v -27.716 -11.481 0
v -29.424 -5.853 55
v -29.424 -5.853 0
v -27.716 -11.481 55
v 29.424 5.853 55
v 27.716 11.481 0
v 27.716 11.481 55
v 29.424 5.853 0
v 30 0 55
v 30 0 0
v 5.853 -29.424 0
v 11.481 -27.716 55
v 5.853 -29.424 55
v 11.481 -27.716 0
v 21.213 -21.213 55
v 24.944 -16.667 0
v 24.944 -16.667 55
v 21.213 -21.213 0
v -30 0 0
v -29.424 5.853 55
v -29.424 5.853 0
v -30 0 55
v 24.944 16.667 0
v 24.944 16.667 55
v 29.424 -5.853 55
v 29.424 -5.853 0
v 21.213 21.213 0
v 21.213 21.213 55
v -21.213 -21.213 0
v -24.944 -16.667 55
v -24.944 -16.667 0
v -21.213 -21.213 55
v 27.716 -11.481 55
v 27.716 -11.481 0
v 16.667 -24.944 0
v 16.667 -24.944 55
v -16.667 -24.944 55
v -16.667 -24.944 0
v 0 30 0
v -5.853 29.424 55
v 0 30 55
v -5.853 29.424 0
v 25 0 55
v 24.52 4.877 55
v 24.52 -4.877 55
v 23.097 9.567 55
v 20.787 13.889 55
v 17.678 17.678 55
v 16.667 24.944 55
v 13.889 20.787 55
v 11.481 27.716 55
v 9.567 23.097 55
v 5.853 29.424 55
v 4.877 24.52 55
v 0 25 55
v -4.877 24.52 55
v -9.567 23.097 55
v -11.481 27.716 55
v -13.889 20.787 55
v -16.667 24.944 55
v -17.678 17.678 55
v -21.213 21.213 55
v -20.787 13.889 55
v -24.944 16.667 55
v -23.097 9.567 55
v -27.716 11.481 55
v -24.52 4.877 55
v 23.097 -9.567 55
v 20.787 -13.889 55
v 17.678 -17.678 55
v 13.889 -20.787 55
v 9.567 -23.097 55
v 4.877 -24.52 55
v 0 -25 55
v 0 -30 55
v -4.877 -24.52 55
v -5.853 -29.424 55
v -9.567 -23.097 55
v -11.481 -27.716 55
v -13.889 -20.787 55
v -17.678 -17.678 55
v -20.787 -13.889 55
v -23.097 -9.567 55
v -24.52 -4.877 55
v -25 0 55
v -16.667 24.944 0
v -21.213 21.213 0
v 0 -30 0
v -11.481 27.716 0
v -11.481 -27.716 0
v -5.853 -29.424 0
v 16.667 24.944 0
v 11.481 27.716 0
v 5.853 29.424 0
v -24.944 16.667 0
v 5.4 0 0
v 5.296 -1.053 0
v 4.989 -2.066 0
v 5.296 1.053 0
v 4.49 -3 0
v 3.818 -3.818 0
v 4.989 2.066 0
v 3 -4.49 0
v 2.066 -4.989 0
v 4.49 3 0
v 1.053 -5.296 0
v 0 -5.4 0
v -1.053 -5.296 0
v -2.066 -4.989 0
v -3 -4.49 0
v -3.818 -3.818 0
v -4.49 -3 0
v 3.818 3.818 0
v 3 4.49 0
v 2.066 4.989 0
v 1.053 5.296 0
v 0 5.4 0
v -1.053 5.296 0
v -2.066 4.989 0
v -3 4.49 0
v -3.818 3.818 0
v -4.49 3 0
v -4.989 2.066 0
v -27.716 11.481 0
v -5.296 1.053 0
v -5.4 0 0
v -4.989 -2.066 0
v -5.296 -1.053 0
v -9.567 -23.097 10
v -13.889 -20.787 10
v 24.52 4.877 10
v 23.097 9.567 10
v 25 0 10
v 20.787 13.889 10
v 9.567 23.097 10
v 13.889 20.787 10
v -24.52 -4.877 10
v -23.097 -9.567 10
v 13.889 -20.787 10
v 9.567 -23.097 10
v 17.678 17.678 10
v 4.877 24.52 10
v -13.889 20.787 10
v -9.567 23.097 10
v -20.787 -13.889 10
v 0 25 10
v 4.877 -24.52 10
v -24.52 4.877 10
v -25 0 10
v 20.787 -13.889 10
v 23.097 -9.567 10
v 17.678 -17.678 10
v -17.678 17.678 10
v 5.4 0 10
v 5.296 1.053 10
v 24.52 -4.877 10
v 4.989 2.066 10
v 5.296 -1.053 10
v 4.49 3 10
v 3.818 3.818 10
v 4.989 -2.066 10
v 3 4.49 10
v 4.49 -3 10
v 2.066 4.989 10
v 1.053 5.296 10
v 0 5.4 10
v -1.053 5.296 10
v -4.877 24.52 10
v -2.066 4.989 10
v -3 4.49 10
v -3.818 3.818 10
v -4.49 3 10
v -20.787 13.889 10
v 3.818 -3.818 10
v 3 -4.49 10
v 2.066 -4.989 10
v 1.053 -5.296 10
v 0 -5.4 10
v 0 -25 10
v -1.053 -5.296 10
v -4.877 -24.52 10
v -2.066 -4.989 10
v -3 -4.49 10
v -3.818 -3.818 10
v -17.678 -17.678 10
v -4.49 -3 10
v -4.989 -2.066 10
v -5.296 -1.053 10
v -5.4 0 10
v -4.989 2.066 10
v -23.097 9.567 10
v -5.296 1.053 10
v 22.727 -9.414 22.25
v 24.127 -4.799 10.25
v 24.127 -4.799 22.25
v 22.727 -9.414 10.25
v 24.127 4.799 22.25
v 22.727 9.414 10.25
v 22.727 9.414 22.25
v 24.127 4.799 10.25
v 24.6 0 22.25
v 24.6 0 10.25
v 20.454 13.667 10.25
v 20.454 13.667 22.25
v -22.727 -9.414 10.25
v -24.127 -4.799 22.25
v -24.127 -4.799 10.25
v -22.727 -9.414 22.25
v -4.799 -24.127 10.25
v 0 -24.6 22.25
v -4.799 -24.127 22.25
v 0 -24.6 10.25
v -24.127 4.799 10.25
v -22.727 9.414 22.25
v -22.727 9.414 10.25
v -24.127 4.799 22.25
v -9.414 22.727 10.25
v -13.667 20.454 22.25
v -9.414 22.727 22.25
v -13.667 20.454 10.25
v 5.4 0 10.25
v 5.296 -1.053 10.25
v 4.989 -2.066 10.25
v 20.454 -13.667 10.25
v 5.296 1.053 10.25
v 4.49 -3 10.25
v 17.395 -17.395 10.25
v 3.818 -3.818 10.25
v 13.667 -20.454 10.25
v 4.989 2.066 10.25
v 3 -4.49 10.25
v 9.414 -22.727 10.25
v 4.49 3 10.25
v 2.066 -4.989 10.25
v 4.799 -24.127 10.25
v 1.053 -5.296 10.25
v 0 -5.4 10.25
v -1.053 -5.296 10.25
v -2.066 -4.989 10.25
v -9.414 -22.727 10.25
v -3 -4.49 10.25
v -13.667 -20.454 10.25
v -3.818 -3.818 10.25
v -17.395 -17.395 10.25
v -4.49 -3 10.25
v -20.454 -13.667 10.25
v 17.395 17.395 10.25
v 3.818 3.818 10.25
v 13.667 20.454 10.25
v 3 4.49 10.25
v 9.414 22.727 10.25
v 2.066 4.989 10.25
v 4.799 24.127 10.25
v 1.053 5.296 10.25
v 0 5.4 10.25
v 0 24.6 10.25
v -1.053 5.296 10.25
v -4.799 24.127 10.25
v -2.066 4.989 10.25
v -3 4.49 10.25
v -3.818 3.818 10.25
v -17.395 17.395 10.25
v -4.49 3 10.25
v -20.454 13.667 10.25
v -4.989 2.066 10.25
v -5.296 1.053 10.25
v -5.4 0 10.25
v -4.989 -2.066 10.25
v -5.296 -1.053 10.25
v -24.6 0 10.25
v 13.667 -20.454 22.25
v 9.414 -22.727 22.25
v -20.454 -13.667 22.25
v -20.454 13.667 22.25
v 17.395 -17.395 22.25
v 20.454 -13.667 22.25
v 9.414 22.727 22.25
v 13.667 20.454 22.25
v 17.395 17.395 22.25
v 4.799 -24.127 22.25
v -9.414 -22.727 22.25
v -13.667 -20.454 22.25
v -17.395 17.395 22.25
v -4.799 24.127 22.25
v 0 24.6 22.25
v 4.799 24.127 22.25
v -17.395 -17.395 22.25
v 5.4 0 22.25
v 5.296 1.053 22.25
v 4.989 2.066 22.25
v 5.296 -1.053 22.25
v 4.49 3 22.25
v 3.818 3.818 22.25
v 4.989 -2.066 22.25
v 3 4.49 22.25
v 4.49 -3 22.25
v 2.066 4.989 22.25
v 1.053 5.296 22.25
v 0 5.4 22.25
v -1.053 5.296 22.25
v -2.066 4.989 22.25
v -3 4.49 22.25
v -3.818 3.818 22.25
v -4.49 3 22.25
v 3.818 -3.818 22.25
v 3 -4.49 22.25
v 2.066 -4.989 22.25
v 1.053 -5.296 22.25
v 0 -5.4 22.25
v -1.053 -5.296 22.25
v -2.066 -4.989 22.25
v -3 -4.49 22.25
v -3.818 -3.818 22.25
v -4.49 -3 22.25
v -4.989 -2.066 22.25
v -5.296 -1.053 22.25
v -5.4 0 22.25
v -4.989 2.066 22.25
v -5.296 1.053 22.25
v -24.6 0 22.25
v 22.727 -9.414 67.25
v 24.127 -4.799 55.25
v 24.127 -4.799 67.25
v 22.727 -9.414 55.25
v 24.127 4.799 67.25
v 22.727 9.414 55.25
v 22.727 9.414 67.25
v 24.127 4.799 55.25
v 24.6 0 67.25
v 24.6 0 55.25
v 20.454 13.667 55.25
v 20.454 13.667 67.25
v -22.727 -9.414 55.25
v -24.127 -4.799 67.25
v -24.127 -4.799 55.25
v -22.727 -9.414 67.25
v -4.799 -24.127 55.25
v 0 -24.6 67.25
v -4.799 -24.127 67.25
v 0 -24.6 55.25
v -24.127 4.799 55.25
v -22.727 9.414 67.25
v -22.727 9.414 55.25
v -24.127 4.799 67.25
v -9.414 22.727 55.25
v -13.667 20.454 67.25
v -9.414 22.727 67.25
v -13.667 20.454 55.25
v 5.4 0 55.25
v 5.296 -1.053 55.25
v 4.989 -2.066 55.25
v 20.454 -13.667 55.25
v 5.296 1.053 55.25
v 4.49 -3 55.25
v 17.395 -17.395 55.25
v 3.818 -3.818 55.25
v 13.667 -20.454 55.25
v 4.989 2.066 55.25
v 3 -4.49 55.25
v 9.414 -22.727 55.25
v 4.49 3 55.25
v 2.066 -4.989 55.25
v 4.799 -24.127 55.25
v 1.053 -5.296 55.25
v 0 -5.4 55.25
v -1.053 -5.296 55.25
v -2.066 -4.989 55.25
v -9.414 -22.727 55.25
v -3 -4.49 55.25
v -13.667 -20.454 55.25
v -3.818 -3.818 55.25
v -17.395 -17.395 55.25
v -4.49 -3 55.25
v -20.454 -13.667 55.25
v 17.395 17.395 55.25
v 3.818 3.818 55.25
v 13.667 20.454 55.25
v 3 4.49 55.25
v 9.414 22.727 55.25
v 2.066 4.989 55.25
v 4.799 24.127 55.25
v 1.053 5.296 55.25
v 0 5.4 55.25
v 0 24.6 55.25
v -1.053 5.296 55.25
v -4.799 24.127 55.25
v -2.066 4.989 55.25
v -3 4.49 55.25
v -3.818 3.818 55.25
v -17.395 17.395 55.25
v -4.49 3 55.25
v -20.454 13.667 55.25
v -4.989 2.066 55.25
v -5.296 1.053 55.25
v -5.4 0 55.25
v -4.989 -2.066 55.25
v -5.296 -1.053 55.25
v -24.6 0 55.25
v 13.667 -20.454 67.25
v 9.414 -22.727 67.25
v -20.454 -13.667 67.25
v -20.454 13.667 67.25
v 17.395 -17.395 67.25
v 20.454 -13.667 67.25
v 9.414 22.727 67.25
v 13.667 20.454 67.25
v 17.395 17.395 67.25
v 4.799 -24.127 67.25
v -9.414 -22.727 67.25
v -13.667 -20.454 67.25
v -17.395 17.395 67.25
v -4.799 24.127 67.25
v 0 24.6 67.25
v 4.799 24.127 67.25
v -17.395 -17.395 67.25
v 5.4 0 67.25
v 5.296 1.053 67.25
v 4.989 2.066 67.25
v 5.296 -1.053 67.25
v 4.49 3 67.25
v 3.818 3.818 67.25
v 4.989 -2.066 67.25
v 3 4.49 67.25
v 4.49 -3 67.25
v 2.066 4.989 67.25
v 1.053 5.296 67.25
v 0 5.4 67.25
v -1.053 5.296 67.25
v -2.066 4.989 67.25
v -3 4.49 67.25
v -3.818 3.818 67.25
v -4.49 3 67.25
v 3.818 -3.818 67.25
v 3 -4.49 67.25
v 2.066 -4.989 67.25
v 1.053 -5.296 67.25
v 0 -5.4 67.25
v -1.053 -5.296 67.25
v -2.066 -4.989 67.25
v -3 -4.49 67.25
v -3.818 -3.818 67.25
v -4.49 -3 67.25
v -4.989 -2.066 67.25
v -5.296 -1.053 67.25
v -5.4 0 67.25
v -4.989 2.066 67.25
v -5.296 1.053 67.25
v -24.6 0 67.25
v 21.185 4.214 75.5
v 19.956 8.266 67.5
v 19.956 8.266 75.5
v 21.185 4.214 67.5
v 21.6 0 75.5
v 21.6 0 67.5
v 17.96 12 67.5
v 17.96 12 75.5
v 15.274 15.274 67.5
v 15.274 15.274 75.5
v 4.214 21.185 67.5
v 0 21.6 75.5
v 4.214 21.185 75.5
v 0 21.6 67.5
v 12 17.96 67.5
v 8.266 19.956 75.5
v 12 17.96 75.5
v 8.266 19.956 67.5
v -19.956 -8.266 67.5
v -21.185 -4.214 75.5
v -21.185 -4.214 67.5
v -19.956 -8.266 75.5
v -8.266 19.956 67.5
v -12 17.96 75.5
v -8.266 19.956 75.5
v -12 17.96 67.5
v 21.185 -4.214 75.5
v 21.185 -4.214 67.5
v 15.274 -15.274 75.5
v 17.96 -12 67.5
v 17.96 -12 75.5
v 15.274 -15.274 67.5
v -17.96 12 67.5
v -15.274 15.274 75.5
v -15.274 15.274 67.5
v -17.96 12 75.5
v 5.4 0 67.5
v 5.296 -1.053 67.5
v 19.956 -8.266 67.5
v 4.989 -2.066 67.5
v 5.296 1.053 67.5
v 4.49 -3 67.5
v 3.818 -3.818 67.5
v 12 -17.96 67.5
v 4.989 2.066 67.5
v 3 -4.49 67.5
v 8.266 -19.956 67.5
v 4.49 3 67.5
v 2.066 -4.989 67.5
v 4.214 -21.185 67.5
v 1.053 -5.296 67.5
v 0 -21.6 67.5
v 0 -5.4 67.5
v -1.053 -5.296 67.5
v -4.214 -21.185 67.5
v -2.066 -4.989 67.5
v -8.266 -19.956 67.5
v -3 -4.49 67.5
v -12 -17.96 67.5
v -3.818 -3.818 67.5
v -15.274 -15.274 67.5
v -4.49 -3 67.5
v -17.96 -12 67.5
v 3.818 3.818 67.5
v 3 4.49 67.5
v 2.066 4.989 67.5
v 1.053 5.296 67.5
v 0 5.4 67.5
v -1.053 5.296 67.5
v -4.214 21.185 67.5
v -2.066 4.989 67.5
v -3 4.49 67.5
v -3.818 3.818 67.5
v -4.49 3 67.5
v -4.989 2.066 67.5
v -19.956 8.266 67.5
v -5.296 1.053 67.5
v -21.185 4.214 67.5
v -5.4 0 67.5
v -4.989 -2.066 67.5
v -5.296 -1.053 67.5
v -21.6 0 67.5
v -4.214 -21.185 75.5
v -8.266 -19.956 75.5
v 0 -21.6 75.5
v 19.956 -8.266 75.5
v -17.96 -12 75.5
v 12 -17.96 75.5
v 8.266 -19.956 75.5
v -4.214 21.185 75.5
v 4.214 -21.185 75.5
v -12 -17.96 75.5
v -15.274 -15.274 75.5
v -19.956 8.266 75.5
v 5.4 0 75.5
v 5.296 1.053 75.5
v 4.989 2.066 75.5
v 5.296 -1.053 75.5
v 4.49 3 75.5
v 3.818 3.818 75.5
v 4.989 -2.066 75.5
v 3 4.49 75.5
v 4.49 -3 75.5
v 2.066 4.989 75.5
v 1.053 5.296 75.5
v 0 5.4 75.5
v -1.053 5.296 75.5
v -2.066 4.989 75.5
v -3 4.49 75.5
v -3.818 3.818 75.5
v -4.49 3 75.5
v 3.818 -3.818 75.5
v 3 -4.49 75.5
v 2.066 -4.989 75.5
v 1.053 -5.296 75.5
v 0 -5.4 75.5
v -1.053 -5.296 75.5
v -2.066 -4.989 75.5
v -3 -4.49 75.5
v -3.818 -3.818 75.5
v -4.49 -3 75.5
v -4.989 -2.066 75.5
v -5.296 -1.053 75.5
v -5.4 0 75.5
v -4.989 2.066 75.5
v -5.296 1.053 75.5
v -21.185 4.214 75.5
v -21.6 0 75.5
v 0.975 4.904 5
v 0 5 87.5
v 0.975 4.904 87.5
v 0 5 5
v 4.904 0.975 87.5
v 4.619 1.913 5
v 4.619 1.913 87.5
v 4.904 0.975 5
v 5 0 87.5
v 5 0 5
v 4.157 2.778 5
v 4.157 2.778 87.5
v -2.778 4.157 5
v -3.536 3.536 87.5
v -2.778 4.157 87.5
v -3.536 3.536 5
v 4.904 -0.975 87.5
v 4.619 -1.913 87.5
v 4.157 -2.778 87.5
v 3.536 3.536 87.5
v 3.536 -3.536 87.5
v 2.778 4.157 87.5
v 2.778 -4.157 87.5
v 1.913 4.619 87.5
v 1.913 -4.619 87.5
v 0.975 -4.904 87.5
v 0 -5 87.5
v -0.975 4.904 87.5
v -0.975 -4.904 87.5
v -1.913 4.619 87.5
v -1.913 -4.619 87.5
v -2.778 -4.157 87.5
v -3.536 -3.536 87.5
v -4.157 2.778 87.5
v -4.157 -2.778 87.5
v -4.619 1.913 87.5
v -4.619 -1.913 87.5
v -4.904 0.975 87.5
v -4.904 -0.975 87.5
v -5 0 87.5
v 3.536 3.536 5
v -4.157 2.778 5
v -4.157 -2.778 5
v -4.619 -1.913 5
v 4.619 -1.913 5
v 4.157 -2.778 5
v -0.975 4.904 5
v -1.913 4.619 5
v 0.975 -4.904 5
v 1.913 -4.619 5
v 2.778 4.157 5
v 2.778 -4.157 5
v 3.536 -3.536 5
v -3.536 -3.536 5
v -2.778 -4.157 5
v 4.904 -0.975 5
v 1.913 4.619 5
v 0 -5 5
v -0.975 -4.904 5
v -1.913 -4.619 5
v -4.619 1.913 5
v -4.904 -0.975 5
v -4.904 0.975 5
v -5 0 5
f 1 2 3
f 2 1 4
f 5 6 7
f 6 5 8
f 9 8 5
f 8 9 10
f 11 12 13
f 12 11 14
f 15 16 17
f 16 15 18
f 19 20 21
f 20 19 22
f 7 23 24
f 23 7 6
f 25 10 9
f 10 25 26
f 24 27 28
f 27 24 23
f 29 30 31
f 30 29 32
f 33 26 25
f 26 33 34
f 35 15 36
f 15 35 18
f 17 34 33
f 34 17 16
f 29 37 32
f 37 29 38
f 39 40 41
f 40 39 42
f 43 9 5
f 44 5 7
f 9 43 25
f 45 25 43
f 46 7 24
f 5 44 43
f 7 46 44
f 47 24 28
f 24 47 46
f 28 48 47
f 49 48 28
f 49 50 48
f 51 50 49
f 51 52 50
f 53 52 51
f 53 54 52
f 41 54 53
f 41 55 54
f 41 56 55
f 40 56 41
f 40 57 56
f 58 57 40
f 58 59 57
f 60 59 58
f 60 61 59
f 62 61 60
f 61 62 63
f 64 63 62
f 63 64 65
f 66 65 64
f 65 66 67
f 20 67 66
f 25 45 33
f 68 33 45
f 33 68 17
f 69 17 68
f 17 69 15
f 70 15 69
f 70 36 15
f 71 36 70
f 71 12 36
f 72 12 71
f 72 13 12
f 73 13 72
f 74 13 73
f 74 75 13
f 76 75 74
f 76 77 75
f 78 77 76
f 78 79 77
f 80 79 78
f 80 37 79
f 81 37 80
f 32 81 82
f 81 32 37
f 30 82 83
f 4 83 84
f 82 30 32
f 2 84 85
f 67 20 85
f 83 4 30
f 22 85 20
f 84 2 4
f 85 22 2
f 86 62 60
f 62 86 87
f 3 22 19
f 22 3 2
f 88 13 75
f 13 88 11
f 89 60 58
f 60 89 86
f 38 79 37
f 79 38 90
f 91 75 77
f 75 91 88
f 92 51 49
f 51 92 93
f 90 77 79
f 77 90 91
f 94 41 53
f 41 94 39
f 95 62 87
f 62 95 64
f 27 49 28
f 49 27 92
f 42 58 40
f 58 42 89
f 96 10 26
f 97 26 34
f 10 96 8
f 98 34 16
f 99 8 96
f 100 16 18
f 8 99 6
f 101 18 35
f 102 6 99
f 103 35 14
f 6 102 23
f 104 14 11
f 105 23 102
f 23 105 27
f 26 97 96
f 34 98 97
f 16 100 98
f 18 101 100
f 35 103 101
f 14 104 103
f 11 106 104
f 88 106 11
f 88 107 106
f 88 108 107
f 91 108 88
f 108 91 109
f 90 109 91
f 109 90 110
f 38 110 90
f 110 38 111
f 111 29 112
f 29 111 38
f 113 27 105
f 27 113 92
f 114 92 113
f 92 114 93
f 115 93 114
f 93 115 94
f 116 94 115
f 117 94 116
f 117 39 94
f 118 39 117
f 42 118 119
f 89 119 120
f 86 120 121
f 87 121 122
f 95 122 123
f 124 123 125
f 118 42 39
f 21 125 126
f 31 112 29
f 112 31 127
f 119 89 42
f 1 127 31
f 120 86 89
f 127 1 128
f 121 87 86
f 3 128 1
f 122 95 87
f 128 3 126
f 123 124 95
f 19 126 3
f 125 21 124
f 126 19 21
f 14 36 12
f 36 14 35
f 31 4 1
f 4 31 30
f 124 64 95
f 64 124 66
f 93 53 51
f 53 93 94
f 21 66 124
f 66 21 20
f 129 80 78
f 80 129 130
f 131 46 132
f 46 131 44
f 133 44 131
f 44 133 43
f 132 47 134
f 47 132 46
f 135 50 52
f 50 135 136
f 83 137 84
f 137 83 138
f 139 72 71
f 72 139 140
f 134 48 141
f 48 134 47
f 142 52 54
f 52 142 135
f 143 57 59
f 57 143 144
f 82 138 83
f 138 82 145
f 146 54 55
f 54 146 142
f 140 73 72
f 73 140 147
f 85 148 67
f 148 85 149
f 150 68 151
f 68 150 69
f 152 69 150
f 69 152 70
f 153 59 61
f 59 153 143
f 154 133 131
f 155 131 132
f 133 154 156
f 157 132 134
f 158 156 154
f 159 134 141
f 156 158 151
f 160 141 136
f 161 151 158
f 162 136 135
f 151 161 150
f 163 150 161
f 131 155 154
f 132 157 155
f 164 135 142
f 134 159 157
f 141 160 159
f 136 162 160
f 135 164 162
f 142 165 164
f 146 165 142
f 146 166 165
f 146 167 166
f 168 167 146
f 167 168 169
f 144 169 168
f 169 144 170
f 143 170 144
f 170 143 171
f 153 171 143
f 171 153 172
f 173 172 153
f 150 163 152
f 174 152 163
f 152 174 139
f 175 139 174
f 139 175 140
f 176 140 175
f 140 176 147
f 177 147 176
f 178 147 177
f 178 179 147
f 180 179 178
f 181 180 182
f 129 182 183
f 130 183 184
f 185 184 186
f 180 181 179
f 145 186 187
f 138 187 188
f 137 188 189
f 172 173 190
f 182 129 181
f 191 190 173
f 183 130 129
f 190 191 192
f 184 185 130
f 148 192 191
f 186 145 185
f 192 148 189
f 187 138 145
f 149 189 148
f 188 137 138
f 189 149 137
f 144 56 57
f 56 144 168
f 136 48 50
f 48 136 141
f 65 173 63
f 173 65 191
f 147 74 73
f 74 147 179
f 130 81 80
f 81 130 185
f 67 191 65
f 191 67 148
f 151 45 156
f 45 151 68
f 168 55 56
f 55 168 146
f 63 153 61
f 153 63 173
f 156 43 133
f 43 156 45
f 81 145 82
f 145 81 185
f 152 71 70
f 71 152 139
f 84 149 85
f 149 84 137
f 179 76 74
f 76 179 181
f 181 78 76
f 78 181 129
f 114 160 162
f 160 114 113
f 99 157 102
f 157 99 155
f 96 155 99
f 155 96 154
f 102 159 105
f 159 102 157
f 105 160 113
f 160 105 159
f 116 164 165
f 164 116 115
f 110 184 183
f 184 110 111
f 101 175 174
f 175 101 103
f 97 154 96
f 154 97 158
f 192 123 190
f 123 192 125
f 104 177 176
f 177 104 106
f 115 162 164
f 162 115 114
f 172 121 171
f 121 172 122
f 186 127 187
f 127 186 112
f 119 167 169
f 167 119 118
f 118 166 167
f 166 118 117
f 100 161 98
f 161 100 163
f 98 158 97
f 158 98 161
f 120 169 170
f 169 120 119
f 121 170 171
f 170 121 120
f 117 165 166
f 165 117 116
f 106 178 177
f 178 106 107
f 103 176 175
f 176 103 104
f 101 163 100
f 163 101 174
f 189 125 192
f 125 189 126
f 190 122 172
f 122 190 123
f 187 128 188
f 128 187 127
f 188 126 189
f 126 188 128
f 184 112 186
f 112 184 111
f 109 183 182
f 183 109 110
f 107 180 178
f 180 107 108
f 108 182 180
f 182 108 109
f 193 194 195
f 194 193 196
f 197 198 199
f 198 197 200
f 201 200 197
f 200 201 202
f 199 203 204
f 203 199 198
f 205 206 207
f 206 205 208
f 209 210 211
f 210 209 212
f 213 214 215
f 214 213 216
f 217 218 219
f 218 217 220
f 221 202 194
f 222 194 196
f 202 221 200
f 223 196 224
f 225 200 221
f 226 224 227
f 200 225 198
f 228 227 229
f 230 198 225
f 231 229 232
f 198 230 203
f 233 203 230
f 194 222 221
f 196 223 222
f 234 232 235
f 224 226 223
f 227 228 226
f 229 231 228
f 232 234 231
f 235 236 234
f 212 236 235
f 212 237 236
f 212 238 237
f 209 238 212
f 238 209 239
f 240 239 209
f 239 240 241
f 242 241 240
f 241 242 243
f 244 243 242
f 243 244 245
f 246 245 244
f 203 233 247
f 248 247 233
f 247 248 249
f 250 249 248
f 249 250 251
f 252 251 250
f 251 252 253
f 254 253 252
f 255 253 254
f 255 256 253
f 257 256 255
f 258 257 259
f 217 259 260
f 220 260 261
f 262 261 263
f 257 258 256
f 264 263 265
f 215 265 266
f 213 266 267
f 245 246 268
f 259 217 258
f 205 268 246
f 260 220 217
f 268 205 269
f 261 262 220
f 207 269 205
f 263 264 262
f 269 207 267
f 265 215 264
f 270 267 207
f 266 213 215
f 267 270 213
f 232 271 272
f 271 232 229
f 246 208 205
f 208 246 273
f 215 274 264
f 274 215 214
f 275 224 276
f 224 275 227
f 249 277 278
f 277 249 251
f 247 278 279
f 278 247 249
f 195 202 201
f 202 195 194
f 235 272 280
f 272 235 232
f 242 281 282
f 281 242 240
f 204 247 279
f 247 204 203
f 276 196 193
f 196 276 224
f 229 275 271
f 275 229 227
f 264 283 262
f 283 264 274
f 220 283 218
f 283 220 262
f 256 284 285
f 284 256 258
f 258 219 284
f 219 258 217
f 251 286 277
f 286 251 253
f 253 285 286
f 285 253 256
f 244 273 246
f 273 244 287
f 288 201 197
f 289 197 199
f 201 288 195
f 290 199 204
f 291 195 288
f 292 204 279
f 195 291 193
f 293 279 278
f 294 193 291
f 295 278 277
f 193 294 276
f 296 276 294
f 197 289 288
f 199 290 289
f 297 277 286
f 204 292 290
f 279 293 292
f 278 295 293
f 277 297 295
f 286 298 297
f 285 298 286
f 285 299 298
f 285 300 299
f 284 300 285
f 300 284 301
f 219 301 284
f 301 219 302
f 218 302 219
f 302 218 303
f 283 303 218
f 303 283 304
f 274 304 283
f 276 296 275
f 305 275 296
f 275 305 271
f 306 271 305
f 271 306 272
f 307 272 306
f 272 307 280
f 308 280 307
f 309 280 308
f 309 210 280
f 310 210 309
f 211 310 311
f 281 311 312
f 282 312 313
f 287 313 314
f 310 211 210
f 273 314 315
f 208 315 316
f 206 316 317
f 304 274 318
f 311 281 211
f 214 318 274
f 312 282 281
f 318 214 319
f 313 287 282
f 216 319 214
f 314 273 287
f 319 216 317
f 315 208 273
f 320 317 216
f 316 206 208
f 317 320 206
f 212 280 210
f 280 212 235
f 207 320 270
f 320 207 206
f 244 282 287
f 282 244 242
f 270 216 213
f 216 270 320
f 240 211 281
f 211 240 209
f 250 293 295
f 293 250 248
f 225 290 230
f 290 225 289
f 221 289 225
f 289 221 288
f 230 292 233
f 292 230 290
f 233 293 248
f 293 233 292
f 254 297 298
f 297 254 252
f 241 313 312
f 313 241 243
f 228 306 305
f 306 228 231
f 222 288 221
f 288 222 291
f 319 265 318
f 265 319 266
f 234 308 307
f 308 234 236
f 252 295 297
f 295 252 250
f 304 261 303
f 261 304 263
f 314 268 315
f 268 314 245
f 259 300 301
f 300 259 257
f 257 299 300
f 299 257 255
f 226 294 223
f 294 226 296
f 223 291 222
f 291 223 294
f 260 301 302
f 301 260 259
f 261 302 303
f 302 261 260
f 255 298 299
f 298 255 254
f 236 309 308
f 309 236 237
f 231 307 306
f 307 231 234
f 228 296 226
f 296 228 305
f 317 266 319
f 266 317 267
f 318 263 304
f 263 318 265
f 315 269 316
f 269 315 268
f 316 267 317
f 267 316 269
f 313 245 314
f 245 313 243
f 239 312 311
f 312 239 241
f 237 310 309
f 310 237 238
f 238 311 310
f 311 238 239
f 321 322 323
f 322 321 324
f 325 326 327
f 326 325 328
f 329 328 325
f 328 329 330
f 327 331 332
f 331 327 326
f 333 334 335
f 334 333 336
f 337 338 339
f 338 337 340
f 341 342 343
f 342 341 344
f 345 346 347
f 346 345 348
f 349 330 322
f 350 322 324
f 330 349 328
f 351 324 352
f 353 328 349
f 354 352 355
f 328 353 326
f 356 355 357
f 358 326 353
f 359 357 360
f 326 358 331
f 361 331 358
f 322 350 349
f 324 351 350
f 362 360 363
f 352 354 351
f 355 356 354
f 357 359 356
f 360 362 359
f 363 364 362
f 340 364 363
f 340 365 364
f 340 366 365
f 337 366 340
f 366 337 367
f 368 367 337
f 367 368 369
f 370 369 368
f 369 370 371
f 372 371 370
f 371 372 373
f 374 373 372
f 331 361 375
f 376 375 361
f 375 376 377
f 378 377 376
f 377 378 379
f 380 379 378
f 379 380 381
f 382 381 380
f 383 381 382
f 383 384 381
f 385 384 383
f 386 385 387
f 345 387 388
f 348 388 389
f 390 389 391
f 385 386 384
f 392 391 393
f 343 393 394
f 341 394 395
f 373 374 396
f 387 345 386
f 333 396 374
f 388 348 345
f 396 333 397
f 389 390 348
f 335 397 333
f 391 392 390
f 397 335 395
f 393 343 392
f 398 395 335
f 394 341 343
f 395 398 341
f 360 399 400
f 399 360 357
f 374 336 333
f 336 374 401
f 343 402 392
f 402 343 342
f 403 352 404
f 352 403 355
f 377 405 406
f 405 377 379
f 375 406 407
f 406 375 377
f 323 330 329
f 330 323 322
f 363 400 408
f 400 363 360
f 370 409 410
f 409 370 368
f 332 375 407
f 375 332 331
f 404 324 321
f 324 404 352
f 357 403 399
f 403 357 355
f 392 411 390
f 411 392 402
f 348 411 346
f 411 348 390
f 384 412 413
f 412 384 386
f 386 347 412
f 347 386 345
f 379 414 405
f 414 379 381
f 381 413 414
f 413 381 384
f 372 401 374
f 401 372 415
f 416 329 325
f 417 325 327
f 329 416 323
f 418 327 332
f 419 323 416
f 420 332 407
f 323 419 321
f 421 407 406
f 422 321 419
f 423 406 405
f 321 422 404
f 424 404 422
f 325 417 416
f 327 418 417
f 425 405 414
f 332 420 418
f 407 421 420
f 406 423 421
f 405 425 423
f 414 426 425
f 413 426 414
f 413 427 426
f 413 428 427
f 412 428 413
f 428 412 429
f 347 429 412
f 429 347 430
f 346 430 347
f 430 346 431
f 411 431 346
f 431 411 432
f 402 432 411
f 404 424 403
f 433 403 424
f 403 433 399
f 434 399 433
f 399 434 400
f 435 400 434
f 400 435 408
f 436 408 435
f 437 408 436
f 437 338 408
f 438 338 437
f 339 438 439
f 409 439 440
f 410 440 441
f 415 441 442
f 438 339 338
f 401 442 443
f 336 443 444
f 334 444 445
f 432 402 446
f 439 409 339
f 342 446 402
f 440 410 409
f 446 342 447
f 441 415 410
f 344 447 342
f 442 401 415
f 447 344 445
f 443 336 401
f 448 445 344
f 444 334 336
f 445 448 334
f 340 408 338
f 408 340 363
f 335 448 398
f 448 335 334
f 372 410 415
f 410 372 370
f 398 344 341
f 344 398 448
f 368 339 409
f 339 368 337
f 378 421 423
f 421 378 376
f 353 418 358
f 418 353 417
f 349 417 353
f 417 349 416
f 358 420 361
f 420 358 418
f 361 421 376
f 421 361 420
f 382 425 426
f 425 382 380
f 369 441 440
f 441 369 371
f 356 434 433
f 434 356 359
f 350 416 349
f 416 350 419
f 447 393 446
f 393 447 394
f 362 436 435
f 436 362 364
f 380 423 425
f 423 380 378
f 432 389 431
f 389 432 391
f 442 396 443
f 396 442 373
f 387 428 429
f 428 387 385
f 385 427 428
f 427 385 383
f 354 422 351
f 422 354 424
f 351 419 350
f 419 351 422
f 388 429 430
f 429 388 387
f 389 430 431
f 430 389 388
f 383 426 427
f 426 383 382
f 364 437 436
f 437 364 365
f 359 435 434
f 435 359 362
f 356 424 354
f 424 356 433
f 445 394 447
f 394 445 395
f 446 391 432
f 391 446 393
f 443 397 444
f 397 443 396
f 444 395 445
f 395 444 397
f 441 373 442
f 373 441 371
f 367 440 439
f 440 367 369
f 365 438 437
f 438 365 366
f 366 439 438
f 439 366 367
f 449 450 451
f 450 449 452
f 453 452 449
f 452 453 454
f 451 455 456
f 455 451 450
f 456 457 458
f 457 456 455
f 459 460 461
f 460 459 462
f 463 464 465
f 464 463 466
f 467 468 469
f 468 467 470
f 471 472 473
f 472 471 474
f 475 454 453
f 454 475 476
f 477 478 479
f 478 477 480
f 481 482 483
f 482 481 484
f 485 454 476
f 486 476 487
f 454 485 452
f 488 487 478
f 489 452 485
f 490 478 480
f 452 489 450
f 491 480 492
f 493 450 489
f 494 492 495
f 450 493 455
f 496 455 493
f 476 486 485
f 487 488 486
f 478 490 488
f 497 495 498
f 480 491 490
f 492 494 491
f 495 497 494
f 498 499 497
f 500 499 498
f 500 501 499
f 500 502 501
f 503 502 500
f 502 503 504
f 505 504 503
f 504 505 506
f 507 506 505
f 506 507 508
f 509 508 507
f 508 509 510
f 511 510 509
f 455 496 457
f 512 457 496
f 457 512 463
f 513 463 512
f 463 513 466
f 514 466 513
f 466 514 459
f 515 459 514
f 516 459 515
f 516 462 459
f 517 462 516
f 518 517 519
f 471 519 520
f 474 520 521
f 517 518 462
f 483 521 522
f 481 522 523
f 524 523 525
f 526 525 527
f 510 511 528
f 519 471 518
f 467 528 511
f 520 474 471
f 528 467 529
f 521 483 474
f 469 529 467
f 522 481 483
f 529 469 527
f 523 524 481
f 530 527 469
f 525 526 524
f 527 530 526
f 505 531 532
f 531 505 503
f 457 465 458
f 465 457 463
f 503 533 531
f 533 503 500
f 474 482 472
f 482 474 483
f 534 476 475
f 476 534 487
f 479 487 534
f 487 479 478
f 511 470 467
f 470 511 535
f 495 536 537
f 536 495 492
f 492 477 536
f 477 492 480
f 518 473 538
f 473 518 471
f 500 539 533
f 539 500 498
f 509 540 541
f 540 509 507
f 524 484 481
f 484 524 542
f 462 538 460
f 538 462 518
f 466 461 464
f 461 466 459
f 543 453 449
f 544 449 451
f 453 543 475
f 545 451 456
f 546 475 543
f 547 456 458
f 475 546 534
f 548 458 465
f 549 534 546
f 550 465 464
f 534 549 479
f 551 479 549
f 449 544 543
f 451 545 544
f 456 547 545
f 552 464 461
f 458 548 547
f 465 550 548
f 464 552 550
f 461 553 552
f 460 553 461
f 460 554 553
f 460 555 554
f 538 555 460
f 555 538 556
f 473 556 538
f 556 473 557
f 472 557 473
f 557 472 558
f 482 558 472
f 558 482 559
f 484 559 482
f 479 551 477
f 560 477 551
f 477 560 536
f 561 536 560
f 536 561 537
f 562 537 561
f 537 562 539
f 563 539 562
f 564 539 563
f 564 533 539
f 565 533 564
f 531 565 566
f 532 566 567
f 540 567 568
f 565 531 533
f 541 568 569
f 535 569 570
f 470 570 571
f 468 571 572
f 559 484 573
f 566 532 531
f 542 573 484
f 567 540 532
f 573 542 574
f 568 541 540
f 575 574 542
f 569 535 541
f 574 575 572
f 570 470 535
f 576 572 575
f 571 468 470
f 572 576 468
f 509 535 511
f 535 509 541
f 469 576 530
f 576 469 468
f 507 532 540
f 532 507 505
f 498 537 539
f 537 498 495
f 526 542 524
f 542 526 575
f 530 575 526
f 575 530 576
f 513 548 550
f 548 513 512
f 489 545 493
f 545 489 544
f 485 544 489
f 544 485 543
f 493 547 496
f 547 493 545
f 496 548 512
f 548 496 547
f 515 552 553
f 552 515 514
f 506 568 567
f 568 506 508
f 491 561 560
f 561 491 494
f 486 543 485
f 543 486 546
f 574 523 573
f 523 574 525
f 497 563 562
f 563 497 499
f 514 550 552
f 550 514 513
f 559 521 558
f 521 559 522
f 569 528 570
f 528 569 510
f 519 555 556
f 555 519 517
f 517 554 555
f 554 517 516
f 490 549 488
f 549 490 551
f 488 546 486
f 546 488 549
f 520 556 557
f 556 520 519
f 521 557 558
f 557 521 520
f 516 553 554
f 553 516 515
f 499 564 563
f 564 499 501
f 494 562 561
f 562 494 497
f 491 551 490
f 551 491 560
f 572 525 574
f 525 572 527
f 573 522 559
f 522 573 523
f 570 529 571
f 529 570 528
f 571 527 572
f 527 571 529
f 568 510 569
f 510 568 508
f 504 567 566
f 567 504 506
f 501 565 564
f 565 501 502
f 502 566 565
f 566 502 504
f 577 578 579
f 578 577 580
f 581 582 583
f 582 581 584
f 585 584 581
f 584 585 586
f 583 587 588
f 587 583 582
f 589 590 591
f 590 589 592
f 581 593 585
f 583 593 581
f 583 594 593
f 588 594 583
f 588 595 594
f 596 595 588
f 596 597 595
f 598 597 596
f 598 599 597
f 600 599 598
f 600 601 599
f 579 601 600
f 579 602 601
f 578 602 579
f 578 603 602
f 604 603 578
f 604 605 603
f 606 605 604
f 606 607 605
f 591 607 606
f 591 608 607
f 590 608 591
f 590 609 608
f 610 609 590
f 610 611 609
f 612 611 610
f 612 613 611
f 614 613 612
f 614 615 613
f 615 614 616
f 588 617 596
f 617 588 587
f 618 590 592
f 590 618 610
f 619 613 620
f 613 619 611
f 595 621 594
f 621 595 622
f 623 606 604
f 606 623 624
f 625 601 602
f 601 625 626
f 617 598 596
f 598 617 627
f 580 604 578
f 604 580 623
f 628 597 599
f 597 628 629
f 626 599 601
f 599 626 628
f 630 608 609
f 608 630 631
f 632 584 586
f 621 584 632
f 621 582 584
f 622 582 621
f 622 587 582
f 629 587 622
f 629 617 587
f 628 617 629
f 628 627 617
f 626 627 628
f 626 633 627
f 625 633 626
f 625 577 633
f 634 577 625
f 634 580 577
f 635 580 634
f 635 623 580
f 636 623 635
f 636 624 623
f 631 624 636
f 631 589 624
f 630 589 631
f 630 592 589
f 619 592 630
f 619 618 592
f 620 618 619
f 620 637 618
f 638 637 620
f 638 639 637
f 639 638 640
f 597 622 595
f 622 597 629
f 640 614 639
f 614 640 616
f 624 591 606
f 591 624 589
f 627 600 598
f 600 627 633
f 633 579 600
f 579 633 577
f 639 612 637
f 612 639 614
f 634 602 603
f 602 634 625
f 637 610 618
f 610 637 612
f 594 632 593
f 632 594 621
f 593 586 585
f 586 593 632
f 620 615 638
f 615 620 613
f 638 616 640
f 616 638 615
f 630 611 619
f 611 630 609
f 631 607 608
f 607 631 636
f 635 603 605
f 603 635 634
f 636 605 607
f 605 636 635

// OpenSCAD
$fn = 32;

// ------------------------------------------------------------------------
// Bearing housing: housing d60, two bearings and a shaft
// Every part is its own module, assembly() places them once.
// ------------------------------------------------------------------------

// --- part 1 ---
module housing() {
  difference() {
    cylinder(h = 55, d = 60);
    translate([0, 0, 10]) cylinder(h = 46, d = 50);
    translate([0, 0, -1]) cylinder(h = 12, d = 10.8);
  }
}

// --- part 2 ---
module bearing_lower() {
  difference() {
      translate([0, 0, 0]) cylinder(h = 12, d = 49.2);
      translate([0, 0, -1]) cylinder(h = 14, d = 10.8);
    }
}

// --- part 3 ---
module bearing_upper() {
  difference() {
      translate([0, 0, 0]) cylinder(h = 12, d = 49.2);
      translate([0, 0, -1]) cylinder(h = 14, d = 10.8);
    }
}

// --- part 4 ---
module spacer() {
  difference() {
      translate([0, 0, 0]) cylinder(h = 8, d = 43.2);
      translate([0, 0, -1]) cylinder(h = 10, d = 10.8);
    }
}

// --- part 5 ---
module shaft() {
  translate([0, 0, -41.25]) cylinder(h = 82.5, d = 10);
}

// --- assembly ---
module assembly() {
  translate([0, 0, 0]) rotate([0, 0, 0]) housing();
  translate([0, 0, 10.25]) rotate([0, 0, 0]) bearing_lower();
  translate([0, 0, 55.25]) rotate([0, 0, 0]) bearing_upper();
  translate([0, 0, 67.5]) rotate([0, 0, 0]) spacer();
  translate([0, 0, 46.25]) rotate([0, 0, 0]) shaft();
}

assembly();
